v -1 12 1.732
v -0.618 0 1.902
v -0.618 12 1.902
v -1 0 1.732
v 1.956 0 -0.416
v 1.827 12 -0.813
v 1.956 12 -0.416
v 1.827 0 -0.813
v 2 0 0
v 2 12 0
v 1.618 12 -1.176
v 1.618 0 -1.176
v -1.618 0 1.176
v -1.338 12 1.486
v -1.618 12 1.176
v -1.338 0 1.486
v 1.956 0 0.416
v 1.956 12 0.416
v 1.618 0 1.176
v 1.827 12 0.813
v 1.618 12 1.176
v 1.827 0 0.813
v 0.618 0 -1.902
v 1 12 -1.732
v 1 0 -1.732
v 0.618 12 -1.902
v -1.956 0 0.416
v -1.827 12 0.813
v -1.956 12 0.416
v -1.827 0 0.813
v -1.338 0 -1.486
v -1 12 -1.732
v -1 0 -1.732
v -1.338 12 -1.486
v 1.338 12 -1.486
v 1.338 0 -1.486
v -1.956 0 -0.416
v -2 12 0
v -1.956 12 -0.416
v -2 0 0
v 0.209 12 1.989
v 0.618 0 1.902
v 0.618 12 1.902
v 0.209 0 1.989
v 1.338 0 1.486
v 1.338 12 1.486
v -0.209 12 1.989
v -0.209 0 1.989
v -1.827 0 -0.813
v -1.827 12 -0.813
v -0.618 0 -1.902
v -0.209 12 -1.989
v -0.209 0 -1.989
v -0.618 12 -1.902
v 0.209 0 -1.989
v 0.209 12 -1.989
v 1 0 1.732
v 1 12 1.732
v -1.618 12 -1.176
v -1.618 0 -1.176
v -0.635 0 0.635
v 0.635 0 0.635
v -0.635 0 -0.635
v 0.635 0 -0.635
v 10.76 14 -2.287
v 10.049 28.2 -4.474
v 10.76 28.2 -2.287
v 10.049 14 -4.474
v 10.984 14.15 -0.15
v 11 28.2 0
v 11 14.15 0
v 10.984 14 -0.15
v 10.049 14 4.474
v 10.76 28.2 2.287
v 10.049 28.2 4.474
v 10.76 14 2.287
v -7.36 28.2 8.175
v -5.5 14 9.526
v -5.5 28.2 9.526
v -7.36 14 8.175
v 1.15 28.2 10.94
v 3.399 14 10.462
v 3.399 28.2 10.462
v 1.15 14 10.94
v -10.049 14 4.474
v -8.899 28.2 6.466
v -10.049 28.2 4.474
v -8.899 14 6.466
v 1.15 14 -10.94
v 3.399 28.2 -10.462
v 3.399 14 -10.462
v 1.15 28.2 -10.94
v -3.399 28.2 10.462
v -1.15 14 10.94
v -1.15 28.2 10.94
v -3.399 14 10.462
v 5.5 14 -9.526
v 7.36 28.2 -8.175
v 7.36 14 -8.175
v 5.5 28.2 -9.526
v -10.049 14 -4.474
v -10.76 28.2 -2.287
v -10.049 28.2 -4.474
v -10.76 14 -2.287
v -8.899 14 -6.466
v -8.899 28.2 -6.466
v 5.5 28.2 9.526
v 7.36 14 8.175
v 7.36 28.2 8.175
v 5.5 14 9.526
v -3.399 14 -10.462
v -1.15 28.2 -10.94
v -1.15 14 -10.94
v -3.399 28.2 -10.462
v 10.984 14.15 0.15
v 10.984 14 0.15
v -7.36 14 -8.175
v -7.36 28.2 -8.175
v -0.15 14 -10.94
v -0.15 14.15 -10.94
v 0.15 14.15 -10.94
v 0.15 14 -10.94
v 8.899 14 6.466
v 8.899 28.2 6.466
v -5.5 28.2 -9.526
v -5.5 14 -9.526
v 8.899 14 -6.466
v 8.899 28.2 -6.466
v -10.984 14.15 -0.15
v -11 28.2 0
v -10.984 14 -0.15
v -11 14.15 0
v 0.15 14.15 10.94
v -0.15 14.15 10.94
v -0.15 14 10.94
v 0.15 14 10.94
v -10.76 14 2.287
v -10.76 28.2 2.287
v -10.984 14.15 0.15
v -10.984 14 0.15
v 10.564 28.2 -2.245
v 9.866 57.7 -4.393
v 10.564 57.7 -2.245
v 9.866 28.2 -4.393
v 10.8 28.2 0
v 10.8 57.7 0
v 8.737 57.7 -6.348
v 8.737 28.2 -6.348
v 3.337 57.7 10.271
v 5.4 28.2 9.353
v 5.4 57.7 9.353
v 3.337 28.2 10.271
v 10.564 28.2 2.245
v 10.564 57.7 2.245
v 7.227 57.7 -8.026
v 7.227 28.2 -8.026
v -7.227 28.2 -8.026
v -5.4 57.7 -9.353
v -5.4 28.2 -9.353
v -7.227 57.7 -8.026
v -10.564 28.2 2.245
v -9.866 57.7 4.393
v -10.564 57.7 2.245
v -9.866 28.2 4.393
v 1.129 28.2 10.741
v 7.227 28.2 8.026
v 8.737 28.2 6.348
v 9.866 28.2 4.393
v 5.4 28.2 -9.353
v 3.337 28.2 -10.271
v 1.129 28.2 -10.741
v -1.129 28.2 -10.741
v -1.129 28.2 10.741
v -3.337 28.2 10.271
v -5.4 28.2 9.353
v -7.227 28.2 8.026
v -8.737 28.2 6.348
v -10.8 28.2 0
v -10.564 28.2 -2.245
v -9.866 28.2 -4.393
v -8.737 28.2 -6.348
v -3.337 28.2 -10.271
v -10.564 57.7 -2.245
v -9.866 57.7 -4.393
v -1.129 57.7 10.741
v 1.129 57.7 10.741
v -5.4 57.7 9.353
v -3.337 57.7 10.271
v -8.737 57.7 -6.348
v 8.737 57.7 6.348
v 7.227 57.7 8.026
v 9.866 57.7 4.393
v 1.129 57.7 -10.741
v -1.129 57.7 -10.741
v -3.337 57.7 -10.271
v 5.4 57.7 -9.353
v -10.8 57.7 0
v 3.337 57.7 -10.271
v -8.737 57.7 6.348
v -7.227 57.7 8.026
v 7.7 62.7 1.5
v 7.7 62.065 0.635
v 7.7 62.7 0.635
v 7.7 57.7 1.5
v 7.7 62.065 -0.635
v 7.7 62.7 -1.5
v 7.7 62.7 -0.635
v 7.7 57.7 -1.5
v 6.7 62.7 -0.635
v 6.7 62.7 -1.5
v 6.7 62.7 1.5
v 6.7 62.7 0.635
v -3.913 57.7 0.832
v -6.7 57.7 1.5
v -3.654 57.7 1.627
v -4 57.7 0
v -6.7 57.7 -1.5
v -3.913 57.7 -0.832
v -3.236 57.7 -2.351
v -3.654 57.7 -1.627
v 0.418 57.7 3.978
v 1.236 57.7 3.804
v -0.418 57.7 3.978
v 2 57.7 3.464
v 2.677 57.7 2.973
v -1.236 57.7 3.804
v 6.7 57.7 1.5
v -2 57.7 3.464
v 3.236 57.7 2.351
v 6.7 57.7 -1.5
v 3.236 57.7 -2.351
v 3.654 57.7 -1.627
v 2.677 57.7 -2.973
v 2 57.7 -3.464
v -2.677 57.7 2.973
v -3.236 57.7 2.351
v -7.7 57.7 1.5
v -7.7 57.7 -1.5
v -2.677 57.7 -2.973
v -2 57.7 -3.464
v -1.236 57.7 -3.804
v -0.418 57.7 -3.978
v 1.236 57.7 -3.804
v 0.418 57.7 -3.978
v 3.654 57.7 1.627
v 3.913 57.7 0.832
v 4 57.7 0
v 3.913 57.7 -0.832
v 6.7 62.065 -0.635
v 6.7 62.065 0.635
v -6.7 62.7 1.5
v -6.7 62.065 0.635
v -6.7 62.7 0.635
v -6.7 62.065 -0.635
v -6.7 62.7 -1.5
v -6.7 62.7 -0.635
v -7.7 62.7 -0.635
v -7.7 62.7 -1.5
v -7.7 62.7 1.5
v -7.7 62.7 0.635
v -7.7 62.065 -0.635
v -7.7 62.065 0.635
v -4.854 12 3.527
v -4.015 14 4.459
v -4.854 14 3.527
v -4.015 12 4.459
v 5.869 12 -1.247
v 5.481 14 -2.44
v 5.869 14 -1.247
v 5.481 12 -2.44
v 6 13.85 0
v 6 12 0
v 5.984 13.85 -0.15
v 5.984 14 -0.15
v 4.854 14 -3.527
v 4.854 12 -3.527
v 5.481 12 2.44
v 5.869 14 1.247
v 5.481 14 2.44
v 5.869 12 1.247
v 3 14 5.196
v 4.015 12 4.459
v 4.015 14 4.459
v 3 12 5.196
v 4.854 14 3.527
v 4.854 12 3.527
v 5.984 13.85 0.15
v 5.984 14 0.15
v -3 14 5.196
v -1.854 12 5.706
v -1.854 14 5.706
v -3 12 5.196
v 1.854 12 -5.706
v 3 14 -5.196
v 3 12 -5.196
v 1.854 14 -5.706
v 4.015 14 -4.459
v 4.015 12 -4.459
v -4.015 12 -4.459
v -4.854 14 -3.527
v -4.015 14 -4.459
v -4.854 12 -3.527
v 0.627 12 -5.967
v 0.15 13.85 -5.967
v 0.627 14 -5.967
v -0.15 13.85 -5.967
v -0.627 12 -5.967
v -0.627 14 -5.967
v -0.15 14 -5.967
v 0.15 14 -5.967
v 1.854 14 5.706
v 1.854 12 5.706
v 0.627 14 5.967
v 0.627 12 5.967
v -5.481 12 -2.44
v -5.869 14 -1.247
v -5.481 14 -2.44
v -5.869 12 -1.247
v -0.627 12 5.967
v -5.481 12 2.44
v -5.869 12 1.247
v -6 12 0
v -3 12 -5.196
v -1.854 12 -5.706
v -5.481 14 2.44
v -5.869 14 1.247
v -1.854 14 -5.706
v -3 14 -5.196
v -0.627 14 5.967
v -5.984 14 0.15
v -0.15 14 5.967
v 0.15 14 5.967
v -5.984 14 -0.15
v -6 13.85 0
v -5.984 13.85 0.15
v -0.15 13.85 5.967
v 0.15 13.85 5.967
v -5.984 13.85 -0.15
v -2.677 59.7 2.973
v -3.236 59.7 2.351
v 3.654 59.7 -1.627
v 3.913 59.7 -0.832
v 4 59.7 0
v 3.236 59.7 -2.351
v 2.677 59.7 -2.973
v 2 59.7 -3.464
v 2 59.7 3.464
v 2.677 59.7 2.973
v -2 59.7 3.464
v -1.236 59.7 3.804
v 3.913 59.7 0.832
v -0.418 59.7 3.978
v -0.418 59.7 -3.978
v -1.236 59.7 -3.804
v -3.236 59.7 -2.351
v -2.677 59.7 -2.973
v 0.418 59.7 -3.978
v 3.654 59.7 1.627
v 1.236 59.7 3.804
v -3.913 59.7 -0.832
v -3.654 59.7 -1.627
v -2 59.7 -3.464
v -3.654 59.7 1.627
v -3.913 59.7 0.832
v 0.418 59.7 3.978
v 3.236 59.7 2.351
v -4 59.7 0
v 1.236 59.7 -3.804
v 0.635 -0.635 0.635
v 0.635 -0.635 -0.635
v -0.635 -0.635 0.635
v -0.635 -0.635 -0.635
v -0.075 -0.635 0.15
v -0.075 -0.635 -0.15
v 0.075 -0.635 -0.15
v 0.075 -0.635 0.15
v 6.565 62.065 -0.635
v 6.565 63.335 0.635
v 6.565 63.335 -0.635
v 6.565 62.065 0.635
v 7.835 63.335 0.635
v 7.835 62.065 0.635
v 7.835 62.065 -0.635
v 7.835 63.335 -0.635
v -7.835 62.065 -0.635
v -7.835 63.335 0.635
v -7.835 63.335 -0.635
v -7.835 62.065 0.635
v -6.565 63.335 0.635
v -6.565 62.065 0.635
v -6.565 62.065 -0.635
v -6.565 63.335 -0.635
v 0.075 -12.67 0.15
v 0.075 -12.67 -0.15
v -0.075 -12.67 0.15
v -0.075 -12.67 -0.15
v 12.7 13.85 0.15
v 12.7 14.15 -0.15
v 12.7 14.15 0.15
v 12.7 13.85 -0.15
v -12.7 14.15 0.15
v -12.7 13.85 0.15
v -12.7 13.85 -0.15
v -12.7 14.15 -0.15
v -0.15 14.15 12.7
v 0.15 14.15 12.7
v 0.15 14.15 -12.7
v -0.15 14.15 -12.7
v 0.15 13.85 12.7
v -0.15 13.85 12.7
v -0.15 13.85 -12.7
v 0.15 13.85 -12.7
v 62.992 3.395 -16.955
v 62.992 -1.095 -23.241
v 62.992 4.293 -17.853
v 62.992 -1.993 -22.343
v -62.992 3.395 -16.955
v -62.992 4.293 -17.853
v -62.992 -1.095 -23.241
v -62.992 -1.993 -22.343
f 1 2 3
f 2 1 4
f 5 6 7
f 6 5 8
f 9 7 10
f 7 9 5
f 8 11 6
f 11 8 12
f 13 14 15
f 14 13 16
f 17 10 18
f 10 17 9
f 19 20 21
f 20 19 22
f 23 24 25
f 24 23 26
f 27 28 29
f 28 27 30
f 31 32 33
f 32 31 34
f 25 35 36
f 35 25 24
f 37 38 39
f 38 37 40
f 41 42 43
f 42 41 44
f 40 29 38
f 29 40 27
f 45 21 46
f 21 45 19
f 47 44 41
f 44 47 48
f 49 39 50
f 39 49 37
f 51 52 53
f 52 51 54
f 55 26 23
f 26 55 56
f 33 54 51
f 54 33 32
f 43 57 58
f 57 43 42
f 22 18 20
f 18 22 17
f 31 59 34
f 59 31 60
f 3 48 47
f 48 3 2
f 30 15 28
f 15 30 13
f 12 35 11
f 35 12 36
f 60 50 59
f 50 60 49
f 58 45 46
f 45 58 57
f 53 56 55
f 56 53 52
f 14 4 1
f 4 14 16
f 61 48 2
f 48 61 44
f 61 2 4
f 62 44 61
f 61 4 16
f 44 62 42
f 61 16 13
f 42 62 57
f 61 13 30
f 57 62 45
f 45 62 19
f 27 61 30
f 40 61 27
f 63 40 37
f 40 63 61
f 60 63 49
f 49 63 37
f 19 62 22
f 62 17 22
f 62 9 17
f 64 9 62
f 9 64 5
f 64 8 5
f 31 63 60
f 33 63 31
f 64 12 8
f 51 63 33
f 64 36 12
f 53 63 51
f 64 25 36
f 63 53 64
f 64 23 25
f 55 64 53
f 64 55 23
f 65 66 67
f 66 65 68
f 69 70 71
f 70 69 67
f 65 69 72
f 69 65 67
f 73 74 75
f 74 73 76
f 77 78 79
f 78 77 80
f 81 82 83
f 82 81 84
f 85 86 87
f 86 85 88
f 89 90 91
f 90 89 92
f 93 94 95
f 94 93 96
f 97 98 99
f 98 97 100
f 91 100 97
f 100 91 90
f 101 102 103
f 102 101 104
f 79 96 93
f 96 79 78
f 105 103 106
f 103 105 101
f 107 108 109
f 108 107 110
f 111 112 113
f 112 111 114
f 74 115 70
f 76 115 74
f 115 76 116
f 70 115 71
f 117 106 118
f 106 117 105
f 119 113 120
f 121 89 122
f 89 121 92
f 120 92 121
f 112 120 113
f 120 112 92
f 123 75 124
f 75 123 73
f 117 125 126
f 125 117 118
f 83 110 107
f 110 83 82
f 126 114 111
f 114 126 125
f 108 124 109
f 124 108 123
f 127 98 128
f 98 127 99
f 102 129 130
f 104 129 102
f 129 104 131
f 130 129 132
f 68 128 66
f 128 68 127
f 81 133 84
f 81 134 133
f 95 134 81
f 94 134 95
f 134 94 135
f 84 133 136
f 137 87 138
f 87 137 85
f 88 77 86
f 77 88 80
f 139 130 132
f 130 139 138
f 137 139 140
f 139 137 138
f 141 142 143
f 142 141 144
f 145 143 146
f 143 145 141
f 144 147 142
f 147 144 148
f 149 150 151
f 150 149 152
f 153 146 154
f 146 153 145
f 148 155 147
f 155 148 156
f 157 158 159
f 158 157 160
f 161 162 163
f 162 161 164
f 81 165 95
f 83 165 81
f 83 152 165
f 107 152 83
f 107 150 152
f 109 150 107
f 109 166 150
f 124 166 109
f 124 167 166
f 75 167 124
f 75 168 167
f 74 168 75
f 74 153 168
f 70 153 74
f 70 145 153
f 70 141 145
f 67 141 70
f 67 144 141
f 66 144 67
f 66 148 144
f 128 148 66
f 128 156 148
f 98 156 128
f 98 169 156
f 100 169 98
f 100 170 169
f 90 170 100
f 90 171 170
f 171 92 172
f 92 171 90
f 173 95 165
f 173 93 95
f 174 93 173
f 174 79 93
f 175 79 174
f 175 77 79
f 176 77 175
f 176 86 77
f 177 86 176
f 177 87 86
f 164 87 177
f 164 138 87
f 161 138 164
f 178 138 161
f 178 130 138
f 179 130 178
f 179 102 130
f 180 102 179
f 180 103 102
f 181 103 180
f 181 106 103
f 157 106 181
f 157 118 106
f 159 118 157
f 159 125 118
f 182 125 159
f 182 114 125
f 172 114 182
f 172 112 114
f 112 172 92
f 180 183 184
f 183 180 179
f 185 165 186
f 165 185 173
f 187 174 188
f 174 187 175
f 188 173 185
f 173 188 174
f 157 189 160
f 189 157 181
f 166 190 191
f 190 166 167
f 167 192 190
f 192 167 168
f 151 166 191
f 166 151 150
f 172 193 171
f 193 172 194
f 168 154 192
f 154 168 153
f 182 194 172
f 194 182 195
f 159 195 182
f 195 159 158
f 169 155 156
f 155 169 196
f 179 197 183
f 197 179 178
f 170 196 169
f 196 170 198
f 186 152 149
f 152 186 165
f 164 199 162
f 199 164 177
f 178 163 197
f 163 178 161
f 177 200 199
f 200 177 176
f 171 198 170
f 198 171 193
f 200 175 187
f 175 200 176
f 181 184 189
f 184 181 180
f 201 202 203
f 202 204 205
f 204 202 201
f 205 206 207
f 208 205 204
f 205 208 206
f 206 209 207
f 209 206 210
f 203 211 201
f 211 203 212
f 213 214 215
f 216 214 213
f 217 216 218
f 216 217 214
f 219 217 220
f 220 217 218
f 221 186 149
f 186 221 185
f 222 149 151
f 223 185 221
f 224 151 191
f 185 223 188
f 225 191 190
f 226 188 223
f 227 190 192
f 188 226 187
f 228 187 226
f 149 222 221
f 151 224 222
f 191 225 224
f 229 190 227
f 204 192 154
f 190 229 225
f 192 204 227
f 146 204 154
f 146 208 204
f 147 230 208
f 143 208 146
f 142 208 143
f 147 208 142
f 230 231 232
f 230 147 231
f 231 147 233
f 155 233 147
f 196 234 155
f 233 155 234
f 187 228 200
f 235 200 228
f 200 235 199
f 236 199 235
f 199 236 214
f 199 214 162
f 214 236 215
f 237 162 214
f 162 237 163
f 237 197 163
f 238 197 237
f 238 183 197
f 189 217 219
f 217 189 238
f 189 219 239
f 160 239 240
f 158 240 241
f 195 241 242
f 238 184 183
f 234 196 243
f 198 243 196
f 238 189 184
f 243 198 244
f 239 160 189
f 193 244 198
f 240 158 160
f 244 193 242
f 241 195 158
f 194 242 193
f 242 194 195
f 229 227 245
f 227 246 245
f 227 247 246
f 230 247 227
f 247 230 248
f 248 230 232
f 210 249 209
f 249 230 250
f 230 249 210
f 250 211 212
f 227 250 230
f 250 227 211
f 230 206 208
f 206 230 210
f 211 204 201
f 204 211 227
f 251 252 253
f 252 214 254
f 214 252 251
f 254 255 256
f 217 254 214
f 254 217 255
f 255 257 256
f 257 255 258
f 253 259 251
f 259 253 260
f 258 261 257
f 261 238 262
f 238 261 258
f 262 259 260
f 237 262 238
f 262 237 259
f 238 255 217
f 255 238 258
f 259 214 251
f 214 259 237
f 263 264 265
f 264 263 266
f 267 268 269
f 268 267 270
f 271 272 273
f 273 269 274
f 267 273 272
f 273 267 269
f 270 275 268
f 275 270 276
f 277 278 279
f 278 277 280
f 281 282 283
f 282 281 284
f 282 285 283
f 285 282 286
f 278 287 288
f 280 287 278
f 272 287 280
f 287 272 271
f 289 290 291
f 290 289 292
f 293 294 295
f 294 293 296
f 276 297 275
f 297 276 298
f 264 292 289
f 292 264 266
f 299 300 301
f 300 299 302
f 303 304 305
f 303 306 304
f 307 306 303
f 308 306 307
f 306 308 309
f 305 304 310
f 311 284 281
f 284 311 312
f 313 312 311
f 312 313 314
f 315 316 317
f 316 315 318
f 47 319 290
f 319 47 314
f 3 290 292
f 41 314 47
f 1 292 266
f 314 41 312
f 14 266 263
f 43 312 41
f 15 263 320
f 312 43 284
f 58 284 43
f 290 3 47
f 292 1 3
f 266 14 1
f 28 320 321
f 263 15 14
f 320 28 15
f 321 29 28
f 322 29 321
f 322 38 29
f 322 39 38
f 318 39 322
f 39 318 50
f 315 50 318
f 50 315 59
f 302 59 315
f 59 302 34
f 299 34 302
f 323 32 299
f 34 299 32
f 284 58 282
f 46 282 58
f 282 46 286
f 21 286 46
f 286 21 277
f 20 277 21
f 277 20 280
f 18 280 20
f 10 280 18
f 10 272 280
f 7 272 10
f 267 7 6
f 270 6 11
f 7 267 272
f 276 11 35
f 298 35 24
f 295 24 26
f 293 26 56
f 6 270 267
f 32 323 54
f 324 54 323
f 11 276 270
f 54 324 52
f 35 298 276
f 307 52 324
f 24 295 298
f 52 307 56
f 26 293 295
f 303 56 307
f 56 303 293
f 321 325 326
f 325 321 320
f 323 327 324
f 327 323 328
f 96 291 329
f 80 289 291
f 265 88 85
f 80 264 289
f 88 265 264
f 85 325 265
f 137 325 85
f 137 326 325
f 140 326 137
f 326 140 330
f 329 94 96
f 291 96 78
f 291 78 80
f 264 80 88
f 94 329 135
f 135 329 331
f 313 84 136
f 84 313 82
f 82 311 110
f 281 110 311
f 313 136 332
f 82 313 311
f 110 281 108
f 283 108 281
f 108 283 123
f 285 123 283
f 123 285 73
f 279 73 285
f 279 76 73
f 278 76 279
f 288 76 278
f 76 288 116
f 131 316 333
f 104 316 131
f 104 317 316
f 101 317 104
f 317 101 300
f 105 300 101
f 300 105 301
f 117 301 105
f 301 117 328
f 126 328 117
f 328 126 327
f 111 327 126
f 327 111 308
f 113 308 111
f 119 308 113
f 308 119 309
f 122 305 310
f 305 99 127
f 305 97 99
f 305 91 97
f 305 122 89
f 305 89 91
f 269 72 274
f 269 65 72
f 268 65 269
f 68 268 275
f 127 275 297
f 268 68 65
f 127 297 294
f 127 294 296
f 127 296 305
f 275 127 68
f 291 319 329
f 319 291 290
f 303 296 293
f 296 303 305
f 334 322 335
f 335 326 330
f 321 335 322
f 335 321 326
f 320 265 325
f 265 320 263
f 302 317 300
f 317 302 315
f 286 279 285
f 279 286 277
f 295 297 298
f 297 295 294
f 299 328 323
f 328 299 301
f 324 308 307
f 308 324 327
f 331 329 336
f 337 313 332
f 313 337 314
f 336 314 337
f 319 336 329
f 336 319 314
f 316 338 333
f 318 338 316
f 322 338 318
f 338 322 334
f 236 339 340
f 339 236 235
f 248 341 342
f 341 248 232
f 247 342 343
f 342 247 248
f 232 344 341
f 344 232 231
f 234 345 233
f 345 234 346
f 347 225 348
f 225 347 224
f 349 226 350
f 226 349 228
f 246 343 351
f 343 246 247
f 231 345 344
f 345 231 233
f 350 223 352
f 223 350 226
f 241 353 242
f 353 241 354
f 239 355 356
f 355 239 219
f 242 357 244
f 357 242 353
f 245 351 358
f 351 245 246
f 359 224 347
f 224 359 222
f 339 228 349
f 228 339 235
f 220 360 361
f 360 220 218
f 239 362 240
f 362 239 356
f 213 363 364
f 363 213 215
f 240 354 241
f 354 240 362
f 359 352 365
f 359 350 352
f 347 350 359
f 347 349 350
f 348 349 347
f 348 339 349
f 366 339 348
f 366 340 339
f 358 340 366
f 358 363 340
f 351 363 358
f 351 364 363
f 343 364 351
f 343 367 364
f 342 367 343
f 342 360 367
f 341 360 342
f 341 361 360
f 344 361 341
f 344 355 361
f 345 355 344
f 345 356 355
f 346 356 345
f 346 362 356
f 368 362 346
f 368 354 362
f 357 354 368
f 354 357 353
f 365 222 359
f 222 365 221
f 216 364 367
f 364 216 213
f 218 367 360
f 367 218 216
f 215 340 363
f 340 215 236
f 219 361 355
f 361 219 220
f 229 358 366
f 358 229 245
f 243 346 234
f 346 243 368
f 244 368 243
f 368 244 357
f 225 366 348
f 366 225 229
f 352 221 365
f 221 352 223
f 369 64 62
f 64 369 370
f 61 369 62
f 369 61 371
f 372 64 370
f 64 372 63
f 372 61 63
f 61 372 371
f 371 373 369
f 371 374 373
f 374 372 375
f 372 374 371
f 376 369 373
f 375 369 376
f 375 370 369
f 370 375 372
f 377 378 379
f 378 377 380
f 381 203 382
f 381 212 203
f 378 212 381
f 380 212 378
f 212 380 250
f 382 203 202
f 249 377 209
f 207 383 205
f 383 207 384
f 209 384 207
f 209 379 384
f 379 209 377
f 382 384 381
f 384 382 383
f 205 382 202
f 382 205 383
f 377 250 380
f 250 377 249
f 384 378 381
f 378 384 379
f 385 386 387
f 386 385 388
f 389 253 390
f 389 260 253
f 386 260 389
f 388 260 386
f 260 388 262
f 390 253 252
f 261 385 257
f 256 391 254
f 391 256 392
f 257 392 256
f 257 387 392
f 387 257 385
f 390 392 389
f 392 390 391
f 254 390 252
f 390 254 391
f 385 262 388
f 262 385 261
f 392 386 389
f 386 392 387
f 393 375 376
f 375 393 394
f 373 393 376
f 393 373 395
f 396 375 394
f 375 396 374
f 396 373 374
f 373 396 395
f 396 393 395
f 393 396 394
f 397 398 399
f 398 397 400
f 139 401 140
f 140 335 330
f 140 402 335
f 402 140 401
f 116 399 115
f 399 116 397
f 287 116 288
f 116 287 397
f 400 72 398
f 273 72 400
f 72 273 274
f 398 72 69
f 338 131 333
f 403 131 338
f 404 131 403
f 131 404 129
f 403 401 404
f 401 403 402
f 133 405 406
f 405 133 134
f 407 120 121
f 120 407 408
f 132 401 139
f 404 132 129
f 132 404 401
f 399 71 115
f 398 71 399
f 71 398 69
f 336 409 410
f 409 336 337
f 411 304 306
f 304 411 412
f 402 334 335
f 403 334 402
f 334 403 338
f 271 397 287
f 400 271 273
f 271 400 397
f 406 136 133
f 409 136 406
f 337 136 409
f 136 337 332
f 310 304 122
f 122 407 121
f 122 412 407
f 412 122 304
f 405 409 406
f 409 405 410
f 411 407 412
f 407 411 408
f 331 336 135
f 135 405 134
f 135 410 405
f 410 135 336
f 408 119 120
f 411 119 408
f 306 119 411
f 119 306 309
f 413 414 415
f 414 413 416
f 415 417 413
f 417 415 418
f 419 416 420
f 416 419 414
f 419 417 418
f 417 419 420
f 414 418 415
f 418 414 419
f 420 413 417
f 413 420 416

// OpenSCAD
include <../mo/mo.scad>

motorShaftDepth = 14;
motorShaftDiameter = 4;
motorGearShoulderDepth = 2;
motorGearShoulderDiameter = 12;
motorGearCapDepth = 3;
motorGearCapDiameter = 22;
motorGearDepth = 8.2;
motorGearDiameter = 22;
motorMotorDepth = 27.5;
motorMotorDiameter = 21.6;
motorMotorCapDepth = 2;
motorMotorCapDiameter = 21.6;
motorMotorEndCapDepth = 2;
motorMotorEndCapDiameter = 8;
motorConnectorDepth = 5;
motorConnectorWidth = 1;
motorConnectorHeight = 3;

motorBodyLength = 2*motorGearCapDepth+motorGearDepth+motorMotorDepth+motorMotorCapDepth+motorConnectorDepth;

positions = [
  [ [ 0, 0, 0 ], [ 0, 0, 1 ], 0 ],
  [ [ 0, -motorShaftDepth, 0 ], [ 0, 0, 1 ], 0 ],
  [ [ motorMotorDiameter/3, motorBodyLength, 0 ], [ 0, 0, 1 ], 180 ],
  [ [ -motorMotorDiameter/3, motorBodyLength, 0 ], [ 0, 0, 1 ], 180 ],
];

module actPlanetaryGearMotorPrecision( p = 0, info = false ) {
  moPresent( positions, p, info )
    rotate( [-90,0,0] ){
      color( Steel ) {
        translate([0,0,-motorShaftDepth/2])
          cylinder( h = motorShaftDepth, r = motorShaftDiameter/2, center = true  );
        translate([0,0,motorGearCapDepth+motorGearDepth/2])
          cylinder( h = motorGearDepth, r = motorGearDiameter/2, center = true  );
        translate([0,0,2*motorGearCapDepth+motorGearDepth+motorMotorDepth/2])
          cylinder( h = motorMotorDepth, r = motorMotorDiameter/2, center = true  );
        translate([motorMotorDiameter/3,0,2*motorGearCapDepth+motorGearDepth+motorMotorDepth+motorMotorCapDepth+motorConnectorDepth/2])
          cube( [ motorConnectorWidth, motorConnectorHeight, motorConnectorDepth ], center = true  );
        translate([-motorMotorDiameter/3,0,2*motorGearCapDepth+motorGearDepth+motorMotorDepth+motorMotorCapDepth+motorConnectorDepth/2])
          cube( [ motorConnectorWidth, motorConnectorHeight, motorConnectorDepth ], center = true  );
      }
      color( [0.1,0.1,0.1] ){
        translate([0,0,-motorGearShoulderDepth/2])
          cylinder( h = motorGearShoulderDepth, r = motorGearShoulderDiameter/2, center = true  );
        translate([0,0,motorGearCapDepth/2])
          cylinder( h = motorGearCapDepth, r = motorGearCapDiameter/2, center = true  );
        translate([0,0,motorGearCapDepth+motorGearDepth+motorGearCapDepth/2])
          cylinder( h = motorGearCapDepth, r = motorGearCapDiameter/2, center = true );
        translate([0,0,2*motorGearCapDepth+motorGearDepth+motorMotorDepth+motorMotorCapDepth+motorMotorEndCapDepth/2])
          cylinder( h = motorMotorEndCapDepth, r = motorMotorEndCapDiameter/2, center = true  );
        translate([0,0,2*motorGearCapDepth+motorGearDepth+motorMotorDepth+motorMotorCapDepth/2])
          cylinder( h = motorMotorCapDepth, r = motorMotorCapDiameter/2, center = true );
      }
   } 
}

function actPlanetaryGearMotorPrecisionPosition( p = 0 ) = positions[ p ];

moMoveOriginTo( actPlanetaryGearMotorPrecisionPosition( 1 ) )
  actPlanetaryGearMotorPrecision( 0, info = true, $name = true );
